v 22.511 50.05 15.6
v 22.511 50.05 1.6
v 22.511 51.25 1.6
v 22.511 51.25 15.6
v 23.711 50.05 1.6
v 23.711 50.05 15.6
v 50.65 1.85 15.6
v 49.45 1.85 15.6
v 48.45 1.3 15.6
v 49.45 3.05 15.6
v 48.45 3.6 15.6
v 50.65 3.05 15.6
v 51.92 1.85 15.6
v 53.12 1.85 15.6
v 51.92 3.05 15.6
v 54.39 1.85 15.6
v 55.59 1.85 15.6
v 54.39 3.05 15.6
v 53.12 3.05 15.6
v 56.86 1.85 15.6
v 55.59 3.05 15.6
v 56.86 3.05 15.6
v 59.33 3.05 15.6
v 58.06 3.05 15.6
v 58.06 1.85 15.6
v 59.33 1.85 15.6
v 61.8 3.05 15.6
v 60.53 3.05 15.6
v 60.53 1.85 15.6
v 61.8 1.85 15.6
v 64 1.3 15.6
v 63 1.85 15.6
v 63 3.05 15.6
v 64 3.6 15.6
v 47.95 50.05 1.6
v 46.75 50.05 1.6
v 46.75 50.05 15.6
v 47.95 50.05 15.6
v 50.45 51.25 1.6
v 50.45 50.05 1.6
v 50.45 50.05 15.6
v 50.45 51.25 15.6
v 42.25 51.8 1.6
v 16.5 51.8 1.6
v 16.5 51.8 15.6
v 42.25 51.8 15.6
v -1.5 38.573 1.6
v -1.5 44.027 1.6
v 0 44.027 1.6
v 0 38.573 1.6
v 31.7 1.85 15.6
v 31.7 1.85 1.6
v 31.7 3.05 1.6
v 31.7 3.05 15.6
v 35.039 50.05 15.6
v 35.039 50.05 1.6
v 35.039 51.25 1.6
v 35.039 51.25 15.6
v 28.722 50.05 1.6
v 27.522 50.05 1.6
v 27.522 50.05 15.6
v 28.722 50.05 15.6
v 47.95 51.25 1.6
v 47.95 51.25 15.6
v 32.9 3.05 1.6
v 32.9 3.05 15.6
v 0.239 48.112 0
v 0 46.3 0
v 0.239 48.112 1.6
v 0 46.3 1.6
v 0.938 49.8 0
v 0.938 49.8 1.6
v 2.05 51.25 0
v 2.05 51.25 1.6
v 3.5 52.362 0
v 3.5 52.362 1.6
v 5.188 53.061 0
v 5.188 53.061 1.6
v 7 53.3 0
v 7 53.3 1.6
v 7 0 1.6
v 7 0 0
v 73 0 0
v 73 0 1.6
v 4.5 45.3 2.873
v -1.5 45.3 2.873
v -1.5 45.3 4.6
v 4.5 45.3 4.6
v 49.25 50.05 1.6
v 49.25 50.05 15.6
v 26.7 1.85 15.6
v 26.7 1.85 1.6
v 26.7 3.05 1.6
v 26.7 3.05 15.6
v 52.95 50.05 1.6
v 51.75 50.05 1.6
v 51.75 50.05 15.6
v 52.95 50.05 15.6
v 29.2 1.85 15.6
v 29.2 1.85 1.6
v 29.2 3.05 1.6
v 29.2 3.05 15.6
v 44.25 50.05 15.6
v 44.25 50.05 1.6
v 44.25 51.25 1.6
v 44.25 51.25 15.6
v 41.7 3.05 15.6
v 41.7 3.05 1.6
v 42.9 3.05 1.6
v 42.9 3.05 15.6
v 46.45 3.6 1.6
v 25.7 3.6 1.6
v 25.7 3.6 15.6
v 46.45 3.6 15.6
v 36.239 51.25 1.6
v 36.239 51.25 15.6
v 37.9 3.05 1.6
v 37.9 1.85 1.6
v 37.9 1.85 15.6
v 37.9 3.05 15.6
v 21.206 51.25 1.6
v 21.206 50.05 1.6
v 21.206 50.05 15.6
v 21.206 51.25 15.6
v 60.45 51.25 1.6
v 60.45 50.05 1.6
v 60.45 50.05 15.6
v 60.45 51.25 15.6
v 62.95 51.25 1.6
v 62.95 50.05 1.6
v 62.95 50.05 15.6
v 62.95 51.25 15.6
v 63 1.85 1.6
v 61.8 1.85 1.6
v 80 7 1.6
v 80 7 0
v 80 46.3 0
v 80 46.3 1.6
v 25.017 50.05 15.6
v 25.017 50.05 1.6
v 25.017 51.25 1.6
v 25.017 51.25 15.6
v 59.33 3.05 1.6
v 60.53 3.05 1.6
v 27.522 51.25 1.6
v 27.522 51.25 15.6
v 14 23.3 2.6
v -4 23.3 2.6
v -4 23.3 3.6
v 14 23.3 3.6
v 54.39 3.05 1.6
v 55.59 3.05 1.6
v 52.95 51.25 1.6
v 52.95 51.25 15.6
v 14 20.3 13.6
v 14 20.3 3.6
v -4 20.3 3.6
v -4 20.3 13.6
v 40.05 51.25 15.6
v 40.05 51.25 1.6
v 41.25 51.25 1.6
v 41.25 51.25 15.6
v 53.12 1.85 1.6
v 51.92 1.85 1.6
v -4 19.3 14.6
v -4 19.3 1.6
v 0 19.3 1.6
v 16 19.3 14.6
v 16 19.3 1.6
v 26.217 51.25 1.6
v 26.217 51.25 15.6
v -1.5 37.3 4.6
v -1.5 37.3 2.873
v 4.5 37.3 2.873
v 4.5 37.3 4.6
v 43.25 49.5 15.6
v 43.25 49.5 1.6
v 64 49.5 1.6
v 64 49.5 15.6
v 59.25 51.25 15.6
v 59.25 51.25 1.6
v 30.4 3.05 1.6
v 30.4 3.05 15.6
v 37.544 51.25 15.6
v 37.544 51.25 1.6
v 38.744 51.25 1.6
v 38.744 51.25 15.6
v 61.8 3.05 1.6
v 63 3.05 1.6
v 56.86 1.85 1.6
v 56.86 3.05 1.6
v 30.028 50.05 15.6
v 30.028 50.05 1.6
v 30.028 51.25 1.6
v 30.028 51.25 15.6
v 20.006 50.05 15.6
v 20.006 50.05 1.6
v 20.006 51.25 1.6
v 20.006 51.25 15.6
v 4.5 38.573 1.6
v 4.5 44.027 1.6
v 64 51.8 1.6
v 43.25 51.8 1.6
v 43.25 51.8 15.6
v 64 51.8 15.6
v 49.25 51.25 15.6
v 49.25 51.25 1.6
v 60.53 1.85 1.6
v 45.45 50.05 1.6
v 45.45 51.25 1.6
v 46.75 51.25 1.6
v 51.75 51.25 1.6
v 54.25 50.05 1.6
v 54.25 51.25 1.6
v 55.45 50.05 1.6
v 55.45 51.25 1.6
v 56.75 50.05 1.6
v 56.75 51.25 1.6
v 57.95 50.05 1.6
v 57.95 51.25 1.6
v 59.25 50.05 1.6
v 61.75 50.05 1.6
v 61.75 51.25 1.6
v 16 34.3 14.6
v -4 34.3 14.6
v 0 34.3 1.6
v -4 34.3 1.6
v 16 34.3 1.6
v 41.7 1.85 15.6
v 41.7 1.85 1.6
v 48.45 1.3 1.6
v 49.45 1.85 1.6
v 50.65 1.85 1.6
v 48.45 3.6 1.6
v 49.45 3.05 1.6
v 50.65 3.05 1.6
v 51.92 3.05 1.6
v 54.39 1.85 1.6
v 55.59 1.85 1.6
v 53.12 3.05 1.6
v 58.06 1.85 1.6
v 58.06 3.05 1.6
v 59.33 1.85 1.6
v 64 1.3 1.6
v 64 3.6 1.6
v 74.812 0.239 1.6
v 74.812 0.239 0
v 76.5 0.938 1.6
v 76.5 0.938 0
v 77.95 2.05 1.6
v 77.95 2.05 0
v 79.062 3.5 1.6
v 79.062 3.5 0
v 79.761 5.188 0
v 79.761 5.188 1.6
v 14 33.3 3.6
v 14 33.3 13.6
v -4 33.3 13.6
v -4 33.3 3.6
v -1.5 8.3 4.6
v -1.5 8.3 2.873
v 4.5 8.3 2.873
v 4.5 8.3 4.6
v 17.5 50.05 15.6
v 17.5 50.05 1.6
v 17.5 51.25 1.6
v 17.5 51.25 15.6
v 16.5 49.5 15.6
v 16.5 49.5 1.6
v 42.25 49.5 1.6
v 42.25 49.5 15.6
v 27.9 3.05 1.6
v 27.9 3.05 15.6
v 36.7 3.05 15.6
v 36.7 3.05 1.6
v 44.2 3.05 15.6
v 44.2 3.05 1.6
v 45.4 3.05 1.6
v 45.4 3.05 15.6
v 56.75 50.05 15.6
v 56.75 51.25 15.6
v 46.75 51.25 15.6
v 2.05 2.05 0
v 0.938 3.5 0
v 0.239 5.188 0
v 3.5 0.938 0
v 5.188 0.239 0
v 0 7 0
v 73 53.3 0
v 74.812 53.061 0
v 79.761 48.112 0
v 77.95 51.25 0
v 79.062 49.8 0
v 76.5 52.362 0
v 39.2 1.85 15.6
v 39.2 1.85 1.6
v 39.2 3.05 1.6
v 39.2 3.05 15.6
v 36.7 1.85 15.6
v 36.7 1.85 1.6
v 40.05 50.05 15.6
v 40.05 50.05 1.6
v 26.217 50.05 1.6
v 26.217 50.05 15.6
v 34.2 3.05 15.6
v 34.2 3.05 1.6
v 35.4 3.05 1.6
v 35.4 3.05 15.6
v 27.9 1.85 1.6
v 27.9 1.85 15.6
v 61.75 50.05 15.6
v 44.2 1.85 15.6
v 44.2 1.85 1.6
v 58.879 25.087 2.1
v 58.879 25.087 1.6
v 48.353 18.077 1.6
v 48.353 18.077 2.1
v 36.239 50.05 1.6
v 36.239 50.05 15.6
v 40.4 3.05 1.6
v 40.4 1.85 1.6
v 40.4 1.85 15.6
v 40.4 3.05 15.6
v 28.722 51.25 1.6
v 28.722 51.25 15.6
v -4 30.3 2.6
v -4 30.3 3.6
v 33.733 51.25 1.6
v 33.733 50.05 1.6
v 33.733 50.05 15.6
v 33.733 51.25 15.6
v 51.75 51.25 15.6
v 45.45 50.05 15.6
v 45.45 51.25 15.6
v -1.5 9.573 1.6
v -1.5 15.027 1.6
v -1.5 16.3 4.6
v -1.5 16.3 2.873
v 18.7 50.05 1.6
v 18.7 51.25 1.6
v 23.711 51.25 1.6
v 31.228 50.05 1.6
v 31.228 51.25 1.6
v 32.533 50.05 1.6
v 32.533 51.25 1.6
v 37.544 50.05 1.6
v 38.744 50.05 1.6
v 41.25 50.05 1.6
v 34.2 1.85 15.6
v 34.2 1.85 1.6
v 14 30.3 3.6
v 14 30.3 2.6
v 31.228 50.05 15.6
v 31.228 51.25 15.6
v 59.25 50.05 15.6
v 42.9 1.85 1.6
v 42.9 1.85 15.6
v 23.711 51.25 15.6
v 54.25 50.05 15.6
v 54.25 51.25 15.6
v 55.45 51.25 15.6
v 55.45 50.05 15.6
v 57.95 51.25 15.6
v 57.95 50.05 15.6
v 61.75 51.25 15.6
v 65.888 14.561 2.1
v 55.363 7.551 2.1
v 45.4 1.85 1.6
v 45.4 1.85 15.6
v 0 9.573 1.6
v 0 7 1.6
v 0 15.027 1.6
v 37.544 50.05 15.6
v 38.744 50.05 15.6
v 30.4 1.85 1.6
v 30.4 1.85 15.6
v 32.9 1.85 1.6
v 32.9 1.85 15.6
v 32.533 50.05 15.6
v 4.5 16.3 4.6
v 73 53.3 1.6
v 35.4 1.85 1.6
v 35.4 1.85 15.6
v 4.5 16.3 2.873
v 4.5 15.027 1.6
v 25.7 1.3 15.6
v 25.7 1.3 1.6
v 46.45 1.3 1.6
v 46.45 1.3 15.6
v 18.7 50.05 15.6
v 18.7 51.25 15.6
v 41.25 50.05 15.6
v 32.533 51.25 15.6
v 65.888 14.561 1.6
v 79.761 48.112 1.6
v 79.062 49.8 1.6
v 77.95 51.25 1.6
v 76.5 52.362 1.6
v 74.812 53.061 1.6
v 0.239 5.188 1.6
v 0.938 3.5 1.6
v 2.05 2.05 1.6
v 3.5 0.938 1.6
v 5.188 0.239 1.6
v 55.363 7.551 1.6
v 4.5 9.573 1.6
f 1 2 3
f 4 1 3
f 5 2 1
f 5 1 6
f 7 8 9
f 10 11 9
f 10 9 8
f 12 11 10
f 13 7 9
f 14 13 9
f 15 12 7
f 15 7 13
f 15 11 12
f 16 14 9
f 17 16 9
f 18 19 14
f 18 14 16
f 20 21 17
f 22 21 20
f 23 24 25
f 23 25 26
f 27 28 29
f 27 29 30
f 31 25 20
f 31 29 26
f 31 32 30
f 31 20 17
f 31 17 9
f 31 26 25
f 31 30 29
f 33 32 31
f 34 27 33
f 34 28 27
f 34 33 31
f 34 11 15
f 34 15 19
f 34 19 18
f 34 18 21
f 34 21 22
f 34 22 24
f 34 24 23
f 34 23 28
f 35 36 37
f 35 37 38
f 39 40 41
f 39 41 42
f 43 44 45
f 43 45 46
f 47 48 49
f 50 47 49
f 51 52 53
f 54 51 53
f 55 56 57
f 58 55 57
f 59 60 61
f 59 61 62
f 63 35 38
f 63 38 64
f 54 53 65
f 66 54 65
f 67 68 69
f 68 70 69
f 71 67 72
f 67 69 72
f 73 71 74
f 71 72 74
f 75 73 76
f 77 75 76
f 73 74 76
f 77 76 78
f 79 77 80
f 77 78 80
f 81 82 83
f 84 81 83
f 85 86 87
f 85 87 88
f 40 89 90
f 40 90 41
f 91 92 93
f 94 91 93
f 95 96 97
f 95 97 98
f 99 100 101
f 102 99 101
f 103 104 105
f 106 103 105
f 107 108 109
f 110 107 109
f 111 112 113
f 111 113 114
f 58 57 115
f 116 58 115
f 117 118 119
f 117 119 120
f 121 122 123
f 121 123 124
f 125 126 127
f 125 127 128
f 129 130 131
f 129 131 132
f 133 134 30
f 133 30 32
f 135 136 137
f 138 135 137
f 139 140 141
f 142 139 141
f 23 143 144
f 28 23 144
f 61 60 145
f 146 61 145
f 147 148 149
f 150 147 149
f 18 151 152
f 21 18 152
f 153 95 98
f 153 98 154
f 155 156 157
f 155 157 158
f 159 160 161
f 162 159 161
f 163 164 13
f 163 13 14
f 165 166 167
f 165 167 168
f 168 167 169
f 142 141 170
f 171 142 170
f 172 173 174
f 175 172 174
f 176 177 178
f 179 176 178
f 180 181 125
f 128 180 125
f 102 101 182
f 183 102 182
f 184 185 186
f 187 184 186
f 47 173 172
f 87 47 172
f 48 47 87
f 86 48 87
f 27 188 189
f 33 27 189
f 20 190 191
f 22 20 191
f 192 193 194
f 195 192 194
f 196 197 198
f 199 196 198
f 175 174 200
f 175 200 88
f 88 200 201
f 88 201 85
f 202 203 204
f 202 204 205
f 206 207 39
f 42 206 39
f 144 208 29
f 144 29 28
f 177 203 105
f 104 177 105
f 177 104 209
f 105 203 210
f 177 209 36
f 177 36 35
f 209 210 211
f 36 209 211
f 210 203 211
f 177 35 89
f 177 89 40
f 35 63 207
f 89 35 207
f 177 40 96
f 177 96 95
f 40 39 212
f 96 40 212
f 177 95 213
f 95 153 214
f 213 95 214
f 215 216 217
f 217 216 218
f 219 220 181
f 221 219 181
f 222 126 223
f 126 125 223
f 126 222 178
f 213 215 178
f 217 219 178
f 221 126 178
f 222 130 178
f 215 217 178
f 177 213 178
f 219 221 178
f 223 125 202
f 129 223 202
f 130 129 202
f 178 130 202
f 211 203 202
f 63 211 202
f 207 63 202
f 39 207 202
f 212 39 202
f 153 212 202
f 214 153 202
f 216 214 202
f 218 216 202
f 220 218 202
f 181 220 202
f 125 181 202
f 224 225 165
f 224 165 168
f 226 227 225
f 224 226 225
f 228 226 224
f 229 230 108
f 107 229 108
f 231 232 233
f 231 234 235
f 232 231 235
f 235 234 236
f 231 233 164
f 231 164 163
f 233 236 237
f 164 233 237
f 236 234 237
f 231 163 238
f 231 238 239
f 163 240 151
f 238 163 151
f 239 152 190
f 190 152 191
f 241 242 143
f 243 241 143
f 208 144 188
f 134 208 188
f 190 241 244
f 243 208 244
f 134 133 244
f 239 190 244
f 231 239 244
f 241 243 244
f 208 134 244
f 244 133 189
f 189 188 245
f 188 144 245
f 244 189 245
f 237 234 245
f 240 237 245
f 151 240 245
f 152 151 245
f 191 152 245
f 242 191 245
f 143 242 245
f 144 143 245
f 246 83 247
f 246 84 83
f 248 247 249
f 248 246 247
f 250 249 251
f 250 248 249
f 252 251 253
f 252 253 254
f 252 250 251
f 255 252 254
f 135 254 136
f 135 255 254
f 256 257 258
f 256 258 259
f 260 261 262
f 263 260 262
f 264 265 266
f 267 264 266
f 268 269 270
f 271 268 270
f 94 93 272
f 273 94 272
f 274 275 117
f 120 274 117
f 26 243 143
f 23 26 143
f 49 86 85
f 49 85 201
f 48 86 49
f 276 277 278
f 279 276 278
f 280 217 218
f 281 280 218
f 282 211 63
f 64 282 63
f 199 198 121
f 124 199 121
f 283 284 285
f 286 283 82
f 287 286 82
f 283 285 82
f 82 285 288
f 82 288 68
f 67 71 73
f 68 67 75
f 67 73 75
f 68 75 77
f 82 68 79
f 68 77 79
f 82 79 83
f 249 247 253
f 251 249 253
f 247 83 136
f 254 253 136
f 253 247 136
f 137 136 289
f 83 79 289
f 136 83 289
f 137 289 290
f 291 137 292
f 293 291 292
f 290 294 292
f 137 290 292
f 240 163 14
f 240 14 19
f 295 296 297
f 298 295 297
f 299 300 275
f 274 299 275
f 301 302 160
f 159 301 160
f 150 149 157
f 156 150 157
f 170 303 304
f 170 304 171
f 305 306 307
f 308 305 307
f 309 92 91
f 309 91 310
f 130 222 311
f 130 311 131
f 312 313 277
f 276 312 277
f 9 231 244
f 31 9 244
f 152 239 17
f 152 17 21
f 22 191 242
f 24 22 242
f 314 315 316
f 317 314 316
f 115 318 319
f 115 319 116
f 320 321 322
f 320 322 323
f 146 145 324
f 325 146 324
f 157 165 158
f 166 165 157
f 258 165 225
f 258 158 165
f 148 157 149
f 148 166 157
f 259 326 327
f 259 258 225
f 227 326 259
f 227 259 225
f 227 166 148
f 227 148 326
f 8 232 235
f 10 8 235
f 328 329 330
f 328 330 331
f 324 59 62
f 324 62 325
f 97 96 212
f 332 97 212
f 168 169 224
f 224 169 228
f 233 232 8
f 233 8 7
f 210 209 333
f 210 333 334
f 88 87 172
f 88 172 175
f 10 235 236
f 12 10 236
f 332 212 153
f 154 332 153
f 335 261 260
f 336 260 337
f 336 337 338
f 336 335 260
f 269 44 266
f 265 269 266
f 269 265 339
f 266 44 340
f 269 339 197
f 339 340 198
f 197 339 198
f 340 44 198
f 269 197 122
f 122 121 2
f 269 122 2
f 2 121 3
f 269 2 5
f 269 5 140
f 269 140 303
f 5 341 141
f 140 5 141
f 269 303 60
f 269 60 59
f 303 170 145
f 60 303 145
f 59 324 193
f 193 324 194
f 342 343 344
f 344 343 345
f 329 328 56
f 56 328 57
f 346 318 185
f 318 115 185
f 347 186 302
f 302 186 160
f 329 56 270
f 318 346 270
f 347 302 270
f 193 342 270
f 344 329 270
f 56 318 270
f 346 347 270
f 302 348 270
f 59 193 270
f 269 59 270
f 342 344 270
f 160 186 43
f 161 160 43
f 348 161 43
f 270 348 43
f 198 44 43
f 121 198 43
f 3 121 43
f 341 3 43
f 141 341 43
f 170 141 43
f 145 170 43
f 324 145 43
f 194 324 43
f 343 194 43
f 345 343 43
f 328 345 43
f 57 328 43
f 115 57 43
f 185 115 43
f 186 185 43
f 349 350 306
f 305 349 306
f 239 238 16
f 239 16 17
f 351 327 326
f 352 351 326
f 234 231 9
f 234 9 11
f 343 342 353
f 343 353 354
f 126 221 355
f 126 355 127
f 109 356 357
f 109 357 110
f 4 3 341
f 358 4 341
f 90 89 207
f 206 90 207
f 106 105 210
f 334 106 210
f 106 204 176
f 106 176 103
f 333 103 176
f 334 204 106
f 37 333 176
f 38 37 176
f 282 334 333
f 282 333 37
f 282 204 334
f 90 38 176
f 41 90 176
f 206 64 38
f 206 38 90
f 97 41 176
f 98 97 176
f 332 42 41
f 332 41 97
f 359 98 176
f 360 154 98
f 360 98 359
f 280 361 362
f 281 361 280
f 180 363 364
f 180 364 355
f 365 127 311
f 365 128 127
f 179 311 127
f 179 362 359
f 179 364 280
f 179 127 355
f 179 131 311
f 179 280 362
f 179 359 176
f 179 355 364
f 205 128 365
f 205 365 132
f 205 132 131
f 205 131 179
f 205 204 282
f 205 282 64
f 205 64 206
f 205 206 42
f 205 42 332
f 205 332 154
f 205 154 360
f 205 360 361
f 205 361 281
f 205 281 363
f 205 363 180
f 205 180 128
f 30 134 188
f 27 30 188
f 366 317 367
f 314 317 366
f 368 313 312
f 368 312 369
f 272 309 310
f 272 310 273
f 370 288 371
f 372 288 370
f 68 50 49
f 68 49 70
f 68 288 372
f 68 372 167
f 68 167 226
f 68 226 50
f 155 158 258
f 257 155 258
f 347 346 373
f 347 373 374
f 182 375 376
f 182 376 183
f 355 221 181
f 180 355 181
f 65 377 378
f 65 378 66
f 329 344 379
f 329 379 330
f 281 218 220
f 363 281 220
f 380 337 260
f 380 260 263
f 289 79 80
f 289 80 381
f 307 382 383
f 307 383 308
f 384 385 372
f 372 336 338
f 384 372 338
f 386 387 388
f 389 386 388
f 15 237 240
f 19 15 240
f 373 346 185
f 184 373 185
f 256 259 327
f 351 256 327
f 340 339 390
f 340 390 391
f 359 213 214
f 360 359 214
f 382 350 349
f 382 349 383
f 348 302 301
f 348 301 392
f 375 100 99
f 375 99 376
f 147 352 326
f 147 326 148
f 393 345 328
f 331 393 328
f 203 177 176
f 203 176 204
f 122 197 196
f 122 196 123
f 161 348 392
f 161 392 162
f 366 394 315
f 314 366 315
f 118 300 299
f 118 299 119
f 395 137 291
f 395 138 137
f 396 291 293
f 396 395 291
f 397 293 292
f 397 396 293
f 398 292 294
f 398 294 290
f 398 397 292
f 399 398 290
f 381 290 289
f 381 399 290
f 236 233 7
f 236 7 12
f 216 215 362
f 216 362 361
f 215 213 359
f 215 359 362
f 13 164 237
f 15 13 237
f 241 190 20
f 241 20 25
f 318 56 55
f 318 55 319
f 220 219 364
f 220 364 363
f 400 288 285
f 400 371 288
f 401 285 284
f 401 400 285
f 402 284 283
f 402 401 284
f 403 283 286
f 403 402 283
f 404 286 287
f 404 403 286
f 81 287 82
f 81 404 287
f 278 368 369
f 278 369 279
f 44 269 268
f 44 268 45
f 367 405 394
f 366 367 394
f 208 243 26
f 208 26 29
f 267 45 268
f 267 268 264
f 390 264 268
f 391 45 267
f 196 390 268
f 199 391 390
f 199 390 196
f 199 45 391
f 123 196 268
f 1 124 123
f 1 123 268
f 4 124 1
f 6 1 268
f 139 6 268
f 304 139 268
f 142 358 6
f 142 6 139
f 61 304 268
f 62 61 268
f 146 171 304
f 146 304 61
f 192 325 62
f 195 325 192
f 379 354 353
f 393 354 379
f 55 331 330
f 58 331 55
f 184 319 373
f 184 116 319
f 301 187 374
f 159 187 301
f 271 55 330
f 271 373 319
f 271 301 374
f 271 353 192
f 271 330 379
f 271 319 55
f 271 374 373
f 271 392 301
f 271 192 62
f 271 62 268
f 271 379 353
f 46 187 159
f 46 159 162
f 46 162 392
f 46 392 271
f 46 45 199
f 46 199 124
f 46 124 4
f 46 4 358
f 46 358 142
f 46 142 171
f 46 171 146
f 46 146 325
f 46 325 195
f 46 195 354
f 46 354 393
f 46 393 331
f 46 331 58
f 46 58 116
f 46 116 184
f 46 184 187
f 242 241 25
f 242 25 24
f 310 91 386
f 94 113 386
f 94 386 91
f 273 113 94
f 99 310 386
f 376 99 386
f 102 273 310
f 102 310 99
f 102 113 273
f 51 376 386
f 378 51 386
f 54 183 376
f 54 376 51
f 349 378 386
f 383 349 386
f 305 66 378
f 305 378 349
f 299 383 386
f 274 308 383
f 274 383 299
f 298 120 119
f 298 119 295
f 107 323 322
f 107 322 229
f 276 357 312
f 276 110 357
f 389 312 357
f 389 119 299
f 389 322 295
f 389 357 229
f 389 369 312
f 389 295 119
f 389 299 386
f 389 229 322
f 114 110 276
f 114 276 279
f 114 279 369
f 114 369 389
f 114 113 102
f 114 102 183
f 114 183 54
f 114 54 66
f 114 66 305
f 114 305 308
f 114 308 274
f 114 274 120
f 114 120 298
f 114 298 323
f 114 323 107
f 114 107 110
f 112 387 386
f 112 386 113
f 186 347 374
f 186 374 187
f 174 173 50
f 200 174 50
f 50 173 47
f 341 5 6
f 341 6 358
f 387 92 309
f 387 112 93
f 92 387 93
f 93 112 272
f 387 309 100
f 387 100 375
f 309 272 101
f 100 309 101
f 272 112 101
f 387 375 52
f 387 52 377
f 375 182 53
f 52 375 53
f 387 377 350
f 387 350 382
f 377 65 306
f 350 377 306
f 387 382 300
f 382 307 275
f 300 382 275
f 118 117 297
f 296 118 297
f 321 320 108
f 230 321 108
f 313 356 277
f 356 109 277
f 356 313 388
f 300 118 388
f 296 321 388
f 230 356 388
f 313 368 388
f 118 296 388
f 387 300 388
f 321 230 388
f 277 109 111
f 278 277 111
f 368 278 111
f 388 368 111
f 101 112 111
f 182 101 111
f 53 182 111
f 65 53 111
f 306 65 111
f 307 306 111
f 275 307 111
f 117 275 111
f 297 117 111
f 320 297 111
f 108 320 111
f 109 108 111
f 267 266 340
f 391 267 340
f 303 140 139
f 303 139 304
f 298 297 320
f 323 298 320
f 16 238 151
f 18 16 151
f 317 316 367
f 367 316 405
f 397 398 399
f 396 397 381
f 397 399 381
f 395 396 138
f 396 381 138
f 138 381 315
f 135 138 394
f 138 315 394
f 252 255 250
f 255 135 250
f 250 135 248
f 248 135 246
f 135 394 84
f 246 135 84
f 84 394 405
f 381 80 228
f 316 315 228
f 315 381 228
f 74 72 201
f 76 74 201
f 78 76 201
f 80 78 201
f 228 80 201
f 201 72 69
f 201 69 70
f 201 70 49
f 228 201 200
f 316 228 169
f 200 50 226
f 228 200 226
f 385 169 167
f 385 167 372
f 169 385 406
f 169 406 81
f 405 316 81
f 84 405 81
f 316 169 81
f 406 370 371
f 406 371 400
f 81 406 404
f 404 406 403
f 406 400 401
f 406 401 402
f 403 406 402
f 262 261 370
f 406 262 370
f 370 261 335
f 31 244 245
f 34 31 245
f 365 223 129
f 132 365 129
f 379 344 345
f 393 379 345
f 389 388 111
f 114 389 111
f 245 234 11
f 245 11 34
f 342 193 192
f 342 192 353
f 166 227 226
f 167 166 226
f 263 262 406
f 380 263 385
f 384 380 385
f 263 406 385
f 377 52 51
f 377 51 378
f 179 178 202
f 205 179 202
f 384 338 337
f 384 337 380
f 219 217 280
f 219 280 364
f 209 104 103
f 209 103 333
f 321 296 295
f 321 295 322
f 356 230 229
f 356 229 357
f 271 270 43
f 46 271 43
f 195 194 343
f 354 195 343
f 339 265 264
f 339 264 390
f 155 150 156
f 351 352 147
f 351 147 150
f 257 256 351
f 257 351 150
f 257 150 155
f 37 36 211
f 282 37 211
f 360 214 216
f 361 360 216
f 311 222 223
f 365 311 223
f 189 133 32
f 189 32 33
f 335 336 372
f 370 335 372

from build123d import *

# Parameters (mm, degrees)
ESQUISSE1_W         = 80
ESQUISSE1_H         = 53.3
BOSS_EXTRU_1_DEPTH  = 1.6
ESQUISSE4_W         = 15.55
ESQUISSE4_H         = 2.3
ESQUISSE4_W_2       = 1.2
ESQUISSE4_H_2       = 1.2
BOSS_EXTRU_4_DEPTH  = 14
ESQUISSE8_W         = 20.75
ESQUISSE8_H         = 2.3
ESQUISSE8_W_2       = 1.2
ESQUISSE8_H_2       = 1.2
BOSS_EXTRU_6_DEPTH  = 14
ESQUISSE19_W        = 20.75
ESQUISSE19_H        = 2.3
ESQUISSE19_W_2      = 1.2
ESQUISSE19_H_2      = 1.2
BOSS_EXTRU_15_DEPTH = 14
ESQUISSE20_W        = 25.75
ESQUISSE20_H        = 2.3
ESQUISSE20_W_2      = 1.2
ESQUISSE20_H_2      = 1.2
BOSS_EXTRU_16_DEPTH = 14
FILLET1_R           = 7
BOSS_EXTRUDE1_DEPTH = 0.5
SKETCH2_W           = 20
SKETCH2_H           = 15
BOSS_EXTRUDE2_DEPTH = 13
SKETCH3_W           = 6
SKETCH3_H           = 8
BOSS_EXTRUDE3_DEPTH = 3
CUT_EXTRUDE1_DEPTH  = 6
CUT_EXTRUDE2_DEPTH  = 18


with BuildPart() as part:
    # Esquisse1 → Boss.-Extru.1 (new body)
    with BuildSketch(Plane.XY):
        with Locations((40, 26.65)):
            Rectangle(ESQUISSE1_W, ESQUISSE1_H)
    extrude(amount=BOSS_EXTRU_1_DEPTH)

    # Fillet1
    fillet1_edges = [part.edges().sort_by_distance(p)[0] for p in [
        (0, 0, 0.8),
        (0, 53.3, 0.8),
        (80, 53.3, 0.8),
        (80, 0, 0.8),
    ]]
    fillet(fillet1_edges, radius=FILLET1_R)

    # Sketch1 → Boss-Extrude1 (add)
    with BuildSketch(Plane.XY.offset(1.6)):
        Polygon((55.362625471, 7.551462799), (65.888368636, 14.561039023), (58.878792412, 25.086782188), (48.353049247, 18.077205964), align=None)
    extrude(amount=BOSS_EXTRUDE1_DEPTH)

    # Sketch2 → Boss-Extrude2 (add)
    with BuildSketch(Plane.XY.offset(1.6)):
        with Locations((6, 26.8)):
            Rectangle(SKETCH2_W, SKETCH2_H)
    extrude(amount=BOSS_EXTRUDE2_DEPTH)

    # Sketch3 → Boss-Extrude3 (add)
    with BuildSketch(Plane.XY.offset(1.6)):
        with Locations((1.5, 41.3)):
            Rectangle(SKETCH3_W, SKETCH3_H)
        with Locations((1.5, 12.3)):
            Rectangle(SKETCH3_W, SKETCH3_H)
    extrude(amount=BOSS_EXTRUDE3_DEPTH)

    # Sketch4 → Cut-Extrude1 (cut)
    with BuildSketch(Plane.ZY.offset(1.5)):
        Polygon((2.872954099, 8.3), (1.6, 9.572630293), (1.6, 8.3), align=None)
        Polygon((2.872954099, 16.3), (1.6, 16.3), (1.6, 15.027369707), align=None)
        Polygon((2.873277986, 37.3), (1.6, 38.572954099), (1.6, 37.3), align=None)
        Polygon((2.872630293, 45.3), (1.6, 44.027045901), (1.6, 45.3), align=None)
    extrude(amount=-CUT_EXTRUDE1_DEPTH, mode=Mode.SUBTRACT)

    # Sketch5 → Cut-Extrude2 (cut)
    with BuildSketch(Plane.ZY.offset(4)):
        Polygon((13.6, 33.3), (3.6, 33.3), (3.6, 30.3), (2.6, 30.3), (2.6, 23.3), (3.6, 23.3), (3.6, 20.3), (13.6, 20.3), align=None)
    extrude(amount=-CUT_EXTRUDE2_DEPTH, mode=Mode.SUBTRACT)


with BuildPart() as body_2:
    # Esquisse4 → Boss.-Extru.4 (new body)
    with BuildSketch(Plane.XY.offset(1.6)):
        with Locations((56.225, 2.45)):
            Rectangle(ESQUISSE4_W, ESQUISSE4_H)
        with Locations((50.05, 2.45)):
            Rectangle(ESQUISSE4_W_2, ESQUISSE4_H_2, mode=Mode.SUBTRACT)
        with Locations((52.52, 2.45)):
            Rectangle(ESQUISSE4_W_2, ESQUISSE4_H_2, mode=Mode.SUBTRACT)
        with Locations((54.99, 2.45)):
            Rectangle(ESQUISSE4_W_2, ESQUISSE4_H_2, mode=Mode.SUBTRACT)
        with Locations((57.46, 2.45)):
            Rectangle(ESQUISSE4_W_2, ESQUISSE4_H_2, mode=Mode.SUBTRACT)
        with Locations((59.93, 2.45)):
            Rectangle(ESQUISSE4_W_2, ESQUISSE4_H_2, mode=Mode.SUBTRACT)
        with Locations((62.4, 2.45)):
            Rectangle(ESQUISSE4_W_2, ESQUISSE4_H_2, mode=Mode.SUBTRACT)
    extrude(amount=BOSS_EXTRU_4_DEPTH)


with BuildPart() as body_3:
    # Esquisse8 → Boss.-Extru.6 (new body)
    with BuildSketch(Plane.XY.offset(1.6)):
        with Locations((36.075, 2.45)):
            Rectangle(ESQUISSE8_W, ESQUISSE8_H)
        with Locations((27.3, 2.45)):
            Rectangle(ESQUISSE8_W_2, ESQUISSE8_H_2, mode=Mode.SUBTRACT)
        with Locations((29.8, 2.45)):
            Rectangle(ESQUISSE8_W_2, ESQUISSE8_H_2, mode=Mode.SUBTRACT)
        with Locations((32.3, 2.45)):
            Rectangle(ESQUISSE8_W_2, ESQUISSE8_H_2, mode=Mode.SUBTRACT)
        with Locations((34.8, 2.45)):
            Rectangle(ESQUISSE8_W_2, ESQUISSE8_H_2, mode=Mode.SUBTRACT)
        with Locations((37.3, 2.45)):
            Rectangle(ESQUISSE8_W_2, ESQUISSE8_H_2, mode=Mode.SUBTRACT)
        with Locations((39.8, 2.45)):
            Rectangle(ESQUISSE8_W_2, ESQUISSE8_H_2, mode=Mode.SUBTRACT)
        with Locations((42.3, 2.45)):
            Rectangle(ESQUISSE8_W_2, ESQUISSE8_H_2, mode=Mode.SUBTRACT)
        with Locations((44.8, 2.45)):
            Rectangle(ESQUISSE8_W_2, ESQUISSE8_H_2, mode=Mode.SUBTRACT)
    extrude(amount=BOSS_EXTRU_6_DEPTH)


with BuildPart() as body_4:
    # Esquisse19 → Boss.-Extru.15 (new body)
    with BuildSketch(Plane.XY.offset(1.6)):
        with Locations((53.625, 50.65)):
            Rectangle(ESQUISSE19_W, ESQUISSE19_H)
        with Locations((44.85, 50.65)):
            Rectangle(ESQUISSE19_W_2, ESQUISSE19_H_2, mode=Mode.SUBTRACT)
        with Locations((47.35, 50.65)):
            Rectangle(ESQUISSE19_W_2, ESQUISSE19_H_2, mode=Mode.SUBTRACT)
        with Locations((49.85, 50.65)):
            Rectangle(ESQUISSE19_W_2, ESQUISSE19_H_2, mode=Mode.SUBTRACT)
        with Locations((52.35, 50.65)):
            Rectangle(ESQUISSE19_W_2, ESQUISSE19_H_2, mode=Mode.SUBTRACT)
        with Locations((54.85, 50.65)):
            Rectangle(ESQUISSE19_W_2, ESQUISSE19_H_2, mode=Mode.SUBTRACT)
        with Locations((57.35, 50.65)):
            Rectangle(ESQUISSE19_W_2, ESQUISSE19_H_2, mode=Mode.SUBTRACT)
        with Locations((59.85, 50.65)):
            Rectangle(ESQUISSE19_W_2, ESQUISSE19_H_2, mode=Mode.SUBTRACT)
        with Locations((62.35, 50.65)):
            Rectangle(ESQUISSE19_W_2, ESQUISSE19_H_2, mode=Mode.SUBTRACT)
    extrude(amount=BOSS_EXTRU_15_DEPTH)


with BuildPart() as body_5:
    # Esquisse20 → Boss.-Extru.16 (new body)
    with BuildSketch(Plane.XY.offset(1.6)):
        with Locations((29.375, 50.65)):
            Rectangle(ESQUISSE20_W, ESQUISSE20_H)
        with Locations((40.65, 50.65)):
            Rectangle(ESQUISSE20_W_2, ESQUISSE20_H_2, mode=Mode.SUBTRACT)
        with Locations((38.144444444, 50.65)):
            Rectangle(ESQUISSE20_W_2, ESQUISSE20_H_2, mode=Mode.SUBTRACT)
        with Locations((35.638888889, 50.65)):
            Rectangle(ESQUISSE20_W_2, ESQUISSE20_H_2, mode=Mode.SUBTRACT)
        with Locations((33.133333333, 50.65)):
            Rectangle(ESQUISSE20_W_2, ESQUISSE20_H_2, mode=Mode.SUBTRACT)
        with Locations((30.627777778, 50.65)):
            Rectangle(ESQUISSE20_W_2, ESQUISSE20_H_2, mode=Mode.SUBTRACT)
        with Locations((28.122222222, 50.65)):
            Rectangle(ESQUISSE20_W_2, ESQUISSE20_H_2, mode=Mode.SUBTRACT)
        with Locations((25.616666667, 50.65)):
            Rectangle(ESQUISSE20_W_2, ESQUISSE20_H_2, mode=Mode.SUBTRACT)
        with Locations((23.111111111, 50.65)):
            Rectangle(ESQUISSE20_W_2, ESQUISSE20_H_2, mode=Mode.SUBTRACT)
        with Locations((20.605555556, 50.65)):
            Rectangle(ESQUISSE20_W_2, ESQUISSE20_H_2, mode=Mode.SUBTRACT)
        with Locations((18.1, 50.65)):
            Rectangle(ESQUISSE20_W_2, ESQUISSE20_H_2, mode=Mode.SUBTRACT)
    extrude(amount=BOSS_EXTRU_16_DEPTH)


solid = Compound([part.part, body_2.part, body_3.part, body_4.part, body_5.part])
